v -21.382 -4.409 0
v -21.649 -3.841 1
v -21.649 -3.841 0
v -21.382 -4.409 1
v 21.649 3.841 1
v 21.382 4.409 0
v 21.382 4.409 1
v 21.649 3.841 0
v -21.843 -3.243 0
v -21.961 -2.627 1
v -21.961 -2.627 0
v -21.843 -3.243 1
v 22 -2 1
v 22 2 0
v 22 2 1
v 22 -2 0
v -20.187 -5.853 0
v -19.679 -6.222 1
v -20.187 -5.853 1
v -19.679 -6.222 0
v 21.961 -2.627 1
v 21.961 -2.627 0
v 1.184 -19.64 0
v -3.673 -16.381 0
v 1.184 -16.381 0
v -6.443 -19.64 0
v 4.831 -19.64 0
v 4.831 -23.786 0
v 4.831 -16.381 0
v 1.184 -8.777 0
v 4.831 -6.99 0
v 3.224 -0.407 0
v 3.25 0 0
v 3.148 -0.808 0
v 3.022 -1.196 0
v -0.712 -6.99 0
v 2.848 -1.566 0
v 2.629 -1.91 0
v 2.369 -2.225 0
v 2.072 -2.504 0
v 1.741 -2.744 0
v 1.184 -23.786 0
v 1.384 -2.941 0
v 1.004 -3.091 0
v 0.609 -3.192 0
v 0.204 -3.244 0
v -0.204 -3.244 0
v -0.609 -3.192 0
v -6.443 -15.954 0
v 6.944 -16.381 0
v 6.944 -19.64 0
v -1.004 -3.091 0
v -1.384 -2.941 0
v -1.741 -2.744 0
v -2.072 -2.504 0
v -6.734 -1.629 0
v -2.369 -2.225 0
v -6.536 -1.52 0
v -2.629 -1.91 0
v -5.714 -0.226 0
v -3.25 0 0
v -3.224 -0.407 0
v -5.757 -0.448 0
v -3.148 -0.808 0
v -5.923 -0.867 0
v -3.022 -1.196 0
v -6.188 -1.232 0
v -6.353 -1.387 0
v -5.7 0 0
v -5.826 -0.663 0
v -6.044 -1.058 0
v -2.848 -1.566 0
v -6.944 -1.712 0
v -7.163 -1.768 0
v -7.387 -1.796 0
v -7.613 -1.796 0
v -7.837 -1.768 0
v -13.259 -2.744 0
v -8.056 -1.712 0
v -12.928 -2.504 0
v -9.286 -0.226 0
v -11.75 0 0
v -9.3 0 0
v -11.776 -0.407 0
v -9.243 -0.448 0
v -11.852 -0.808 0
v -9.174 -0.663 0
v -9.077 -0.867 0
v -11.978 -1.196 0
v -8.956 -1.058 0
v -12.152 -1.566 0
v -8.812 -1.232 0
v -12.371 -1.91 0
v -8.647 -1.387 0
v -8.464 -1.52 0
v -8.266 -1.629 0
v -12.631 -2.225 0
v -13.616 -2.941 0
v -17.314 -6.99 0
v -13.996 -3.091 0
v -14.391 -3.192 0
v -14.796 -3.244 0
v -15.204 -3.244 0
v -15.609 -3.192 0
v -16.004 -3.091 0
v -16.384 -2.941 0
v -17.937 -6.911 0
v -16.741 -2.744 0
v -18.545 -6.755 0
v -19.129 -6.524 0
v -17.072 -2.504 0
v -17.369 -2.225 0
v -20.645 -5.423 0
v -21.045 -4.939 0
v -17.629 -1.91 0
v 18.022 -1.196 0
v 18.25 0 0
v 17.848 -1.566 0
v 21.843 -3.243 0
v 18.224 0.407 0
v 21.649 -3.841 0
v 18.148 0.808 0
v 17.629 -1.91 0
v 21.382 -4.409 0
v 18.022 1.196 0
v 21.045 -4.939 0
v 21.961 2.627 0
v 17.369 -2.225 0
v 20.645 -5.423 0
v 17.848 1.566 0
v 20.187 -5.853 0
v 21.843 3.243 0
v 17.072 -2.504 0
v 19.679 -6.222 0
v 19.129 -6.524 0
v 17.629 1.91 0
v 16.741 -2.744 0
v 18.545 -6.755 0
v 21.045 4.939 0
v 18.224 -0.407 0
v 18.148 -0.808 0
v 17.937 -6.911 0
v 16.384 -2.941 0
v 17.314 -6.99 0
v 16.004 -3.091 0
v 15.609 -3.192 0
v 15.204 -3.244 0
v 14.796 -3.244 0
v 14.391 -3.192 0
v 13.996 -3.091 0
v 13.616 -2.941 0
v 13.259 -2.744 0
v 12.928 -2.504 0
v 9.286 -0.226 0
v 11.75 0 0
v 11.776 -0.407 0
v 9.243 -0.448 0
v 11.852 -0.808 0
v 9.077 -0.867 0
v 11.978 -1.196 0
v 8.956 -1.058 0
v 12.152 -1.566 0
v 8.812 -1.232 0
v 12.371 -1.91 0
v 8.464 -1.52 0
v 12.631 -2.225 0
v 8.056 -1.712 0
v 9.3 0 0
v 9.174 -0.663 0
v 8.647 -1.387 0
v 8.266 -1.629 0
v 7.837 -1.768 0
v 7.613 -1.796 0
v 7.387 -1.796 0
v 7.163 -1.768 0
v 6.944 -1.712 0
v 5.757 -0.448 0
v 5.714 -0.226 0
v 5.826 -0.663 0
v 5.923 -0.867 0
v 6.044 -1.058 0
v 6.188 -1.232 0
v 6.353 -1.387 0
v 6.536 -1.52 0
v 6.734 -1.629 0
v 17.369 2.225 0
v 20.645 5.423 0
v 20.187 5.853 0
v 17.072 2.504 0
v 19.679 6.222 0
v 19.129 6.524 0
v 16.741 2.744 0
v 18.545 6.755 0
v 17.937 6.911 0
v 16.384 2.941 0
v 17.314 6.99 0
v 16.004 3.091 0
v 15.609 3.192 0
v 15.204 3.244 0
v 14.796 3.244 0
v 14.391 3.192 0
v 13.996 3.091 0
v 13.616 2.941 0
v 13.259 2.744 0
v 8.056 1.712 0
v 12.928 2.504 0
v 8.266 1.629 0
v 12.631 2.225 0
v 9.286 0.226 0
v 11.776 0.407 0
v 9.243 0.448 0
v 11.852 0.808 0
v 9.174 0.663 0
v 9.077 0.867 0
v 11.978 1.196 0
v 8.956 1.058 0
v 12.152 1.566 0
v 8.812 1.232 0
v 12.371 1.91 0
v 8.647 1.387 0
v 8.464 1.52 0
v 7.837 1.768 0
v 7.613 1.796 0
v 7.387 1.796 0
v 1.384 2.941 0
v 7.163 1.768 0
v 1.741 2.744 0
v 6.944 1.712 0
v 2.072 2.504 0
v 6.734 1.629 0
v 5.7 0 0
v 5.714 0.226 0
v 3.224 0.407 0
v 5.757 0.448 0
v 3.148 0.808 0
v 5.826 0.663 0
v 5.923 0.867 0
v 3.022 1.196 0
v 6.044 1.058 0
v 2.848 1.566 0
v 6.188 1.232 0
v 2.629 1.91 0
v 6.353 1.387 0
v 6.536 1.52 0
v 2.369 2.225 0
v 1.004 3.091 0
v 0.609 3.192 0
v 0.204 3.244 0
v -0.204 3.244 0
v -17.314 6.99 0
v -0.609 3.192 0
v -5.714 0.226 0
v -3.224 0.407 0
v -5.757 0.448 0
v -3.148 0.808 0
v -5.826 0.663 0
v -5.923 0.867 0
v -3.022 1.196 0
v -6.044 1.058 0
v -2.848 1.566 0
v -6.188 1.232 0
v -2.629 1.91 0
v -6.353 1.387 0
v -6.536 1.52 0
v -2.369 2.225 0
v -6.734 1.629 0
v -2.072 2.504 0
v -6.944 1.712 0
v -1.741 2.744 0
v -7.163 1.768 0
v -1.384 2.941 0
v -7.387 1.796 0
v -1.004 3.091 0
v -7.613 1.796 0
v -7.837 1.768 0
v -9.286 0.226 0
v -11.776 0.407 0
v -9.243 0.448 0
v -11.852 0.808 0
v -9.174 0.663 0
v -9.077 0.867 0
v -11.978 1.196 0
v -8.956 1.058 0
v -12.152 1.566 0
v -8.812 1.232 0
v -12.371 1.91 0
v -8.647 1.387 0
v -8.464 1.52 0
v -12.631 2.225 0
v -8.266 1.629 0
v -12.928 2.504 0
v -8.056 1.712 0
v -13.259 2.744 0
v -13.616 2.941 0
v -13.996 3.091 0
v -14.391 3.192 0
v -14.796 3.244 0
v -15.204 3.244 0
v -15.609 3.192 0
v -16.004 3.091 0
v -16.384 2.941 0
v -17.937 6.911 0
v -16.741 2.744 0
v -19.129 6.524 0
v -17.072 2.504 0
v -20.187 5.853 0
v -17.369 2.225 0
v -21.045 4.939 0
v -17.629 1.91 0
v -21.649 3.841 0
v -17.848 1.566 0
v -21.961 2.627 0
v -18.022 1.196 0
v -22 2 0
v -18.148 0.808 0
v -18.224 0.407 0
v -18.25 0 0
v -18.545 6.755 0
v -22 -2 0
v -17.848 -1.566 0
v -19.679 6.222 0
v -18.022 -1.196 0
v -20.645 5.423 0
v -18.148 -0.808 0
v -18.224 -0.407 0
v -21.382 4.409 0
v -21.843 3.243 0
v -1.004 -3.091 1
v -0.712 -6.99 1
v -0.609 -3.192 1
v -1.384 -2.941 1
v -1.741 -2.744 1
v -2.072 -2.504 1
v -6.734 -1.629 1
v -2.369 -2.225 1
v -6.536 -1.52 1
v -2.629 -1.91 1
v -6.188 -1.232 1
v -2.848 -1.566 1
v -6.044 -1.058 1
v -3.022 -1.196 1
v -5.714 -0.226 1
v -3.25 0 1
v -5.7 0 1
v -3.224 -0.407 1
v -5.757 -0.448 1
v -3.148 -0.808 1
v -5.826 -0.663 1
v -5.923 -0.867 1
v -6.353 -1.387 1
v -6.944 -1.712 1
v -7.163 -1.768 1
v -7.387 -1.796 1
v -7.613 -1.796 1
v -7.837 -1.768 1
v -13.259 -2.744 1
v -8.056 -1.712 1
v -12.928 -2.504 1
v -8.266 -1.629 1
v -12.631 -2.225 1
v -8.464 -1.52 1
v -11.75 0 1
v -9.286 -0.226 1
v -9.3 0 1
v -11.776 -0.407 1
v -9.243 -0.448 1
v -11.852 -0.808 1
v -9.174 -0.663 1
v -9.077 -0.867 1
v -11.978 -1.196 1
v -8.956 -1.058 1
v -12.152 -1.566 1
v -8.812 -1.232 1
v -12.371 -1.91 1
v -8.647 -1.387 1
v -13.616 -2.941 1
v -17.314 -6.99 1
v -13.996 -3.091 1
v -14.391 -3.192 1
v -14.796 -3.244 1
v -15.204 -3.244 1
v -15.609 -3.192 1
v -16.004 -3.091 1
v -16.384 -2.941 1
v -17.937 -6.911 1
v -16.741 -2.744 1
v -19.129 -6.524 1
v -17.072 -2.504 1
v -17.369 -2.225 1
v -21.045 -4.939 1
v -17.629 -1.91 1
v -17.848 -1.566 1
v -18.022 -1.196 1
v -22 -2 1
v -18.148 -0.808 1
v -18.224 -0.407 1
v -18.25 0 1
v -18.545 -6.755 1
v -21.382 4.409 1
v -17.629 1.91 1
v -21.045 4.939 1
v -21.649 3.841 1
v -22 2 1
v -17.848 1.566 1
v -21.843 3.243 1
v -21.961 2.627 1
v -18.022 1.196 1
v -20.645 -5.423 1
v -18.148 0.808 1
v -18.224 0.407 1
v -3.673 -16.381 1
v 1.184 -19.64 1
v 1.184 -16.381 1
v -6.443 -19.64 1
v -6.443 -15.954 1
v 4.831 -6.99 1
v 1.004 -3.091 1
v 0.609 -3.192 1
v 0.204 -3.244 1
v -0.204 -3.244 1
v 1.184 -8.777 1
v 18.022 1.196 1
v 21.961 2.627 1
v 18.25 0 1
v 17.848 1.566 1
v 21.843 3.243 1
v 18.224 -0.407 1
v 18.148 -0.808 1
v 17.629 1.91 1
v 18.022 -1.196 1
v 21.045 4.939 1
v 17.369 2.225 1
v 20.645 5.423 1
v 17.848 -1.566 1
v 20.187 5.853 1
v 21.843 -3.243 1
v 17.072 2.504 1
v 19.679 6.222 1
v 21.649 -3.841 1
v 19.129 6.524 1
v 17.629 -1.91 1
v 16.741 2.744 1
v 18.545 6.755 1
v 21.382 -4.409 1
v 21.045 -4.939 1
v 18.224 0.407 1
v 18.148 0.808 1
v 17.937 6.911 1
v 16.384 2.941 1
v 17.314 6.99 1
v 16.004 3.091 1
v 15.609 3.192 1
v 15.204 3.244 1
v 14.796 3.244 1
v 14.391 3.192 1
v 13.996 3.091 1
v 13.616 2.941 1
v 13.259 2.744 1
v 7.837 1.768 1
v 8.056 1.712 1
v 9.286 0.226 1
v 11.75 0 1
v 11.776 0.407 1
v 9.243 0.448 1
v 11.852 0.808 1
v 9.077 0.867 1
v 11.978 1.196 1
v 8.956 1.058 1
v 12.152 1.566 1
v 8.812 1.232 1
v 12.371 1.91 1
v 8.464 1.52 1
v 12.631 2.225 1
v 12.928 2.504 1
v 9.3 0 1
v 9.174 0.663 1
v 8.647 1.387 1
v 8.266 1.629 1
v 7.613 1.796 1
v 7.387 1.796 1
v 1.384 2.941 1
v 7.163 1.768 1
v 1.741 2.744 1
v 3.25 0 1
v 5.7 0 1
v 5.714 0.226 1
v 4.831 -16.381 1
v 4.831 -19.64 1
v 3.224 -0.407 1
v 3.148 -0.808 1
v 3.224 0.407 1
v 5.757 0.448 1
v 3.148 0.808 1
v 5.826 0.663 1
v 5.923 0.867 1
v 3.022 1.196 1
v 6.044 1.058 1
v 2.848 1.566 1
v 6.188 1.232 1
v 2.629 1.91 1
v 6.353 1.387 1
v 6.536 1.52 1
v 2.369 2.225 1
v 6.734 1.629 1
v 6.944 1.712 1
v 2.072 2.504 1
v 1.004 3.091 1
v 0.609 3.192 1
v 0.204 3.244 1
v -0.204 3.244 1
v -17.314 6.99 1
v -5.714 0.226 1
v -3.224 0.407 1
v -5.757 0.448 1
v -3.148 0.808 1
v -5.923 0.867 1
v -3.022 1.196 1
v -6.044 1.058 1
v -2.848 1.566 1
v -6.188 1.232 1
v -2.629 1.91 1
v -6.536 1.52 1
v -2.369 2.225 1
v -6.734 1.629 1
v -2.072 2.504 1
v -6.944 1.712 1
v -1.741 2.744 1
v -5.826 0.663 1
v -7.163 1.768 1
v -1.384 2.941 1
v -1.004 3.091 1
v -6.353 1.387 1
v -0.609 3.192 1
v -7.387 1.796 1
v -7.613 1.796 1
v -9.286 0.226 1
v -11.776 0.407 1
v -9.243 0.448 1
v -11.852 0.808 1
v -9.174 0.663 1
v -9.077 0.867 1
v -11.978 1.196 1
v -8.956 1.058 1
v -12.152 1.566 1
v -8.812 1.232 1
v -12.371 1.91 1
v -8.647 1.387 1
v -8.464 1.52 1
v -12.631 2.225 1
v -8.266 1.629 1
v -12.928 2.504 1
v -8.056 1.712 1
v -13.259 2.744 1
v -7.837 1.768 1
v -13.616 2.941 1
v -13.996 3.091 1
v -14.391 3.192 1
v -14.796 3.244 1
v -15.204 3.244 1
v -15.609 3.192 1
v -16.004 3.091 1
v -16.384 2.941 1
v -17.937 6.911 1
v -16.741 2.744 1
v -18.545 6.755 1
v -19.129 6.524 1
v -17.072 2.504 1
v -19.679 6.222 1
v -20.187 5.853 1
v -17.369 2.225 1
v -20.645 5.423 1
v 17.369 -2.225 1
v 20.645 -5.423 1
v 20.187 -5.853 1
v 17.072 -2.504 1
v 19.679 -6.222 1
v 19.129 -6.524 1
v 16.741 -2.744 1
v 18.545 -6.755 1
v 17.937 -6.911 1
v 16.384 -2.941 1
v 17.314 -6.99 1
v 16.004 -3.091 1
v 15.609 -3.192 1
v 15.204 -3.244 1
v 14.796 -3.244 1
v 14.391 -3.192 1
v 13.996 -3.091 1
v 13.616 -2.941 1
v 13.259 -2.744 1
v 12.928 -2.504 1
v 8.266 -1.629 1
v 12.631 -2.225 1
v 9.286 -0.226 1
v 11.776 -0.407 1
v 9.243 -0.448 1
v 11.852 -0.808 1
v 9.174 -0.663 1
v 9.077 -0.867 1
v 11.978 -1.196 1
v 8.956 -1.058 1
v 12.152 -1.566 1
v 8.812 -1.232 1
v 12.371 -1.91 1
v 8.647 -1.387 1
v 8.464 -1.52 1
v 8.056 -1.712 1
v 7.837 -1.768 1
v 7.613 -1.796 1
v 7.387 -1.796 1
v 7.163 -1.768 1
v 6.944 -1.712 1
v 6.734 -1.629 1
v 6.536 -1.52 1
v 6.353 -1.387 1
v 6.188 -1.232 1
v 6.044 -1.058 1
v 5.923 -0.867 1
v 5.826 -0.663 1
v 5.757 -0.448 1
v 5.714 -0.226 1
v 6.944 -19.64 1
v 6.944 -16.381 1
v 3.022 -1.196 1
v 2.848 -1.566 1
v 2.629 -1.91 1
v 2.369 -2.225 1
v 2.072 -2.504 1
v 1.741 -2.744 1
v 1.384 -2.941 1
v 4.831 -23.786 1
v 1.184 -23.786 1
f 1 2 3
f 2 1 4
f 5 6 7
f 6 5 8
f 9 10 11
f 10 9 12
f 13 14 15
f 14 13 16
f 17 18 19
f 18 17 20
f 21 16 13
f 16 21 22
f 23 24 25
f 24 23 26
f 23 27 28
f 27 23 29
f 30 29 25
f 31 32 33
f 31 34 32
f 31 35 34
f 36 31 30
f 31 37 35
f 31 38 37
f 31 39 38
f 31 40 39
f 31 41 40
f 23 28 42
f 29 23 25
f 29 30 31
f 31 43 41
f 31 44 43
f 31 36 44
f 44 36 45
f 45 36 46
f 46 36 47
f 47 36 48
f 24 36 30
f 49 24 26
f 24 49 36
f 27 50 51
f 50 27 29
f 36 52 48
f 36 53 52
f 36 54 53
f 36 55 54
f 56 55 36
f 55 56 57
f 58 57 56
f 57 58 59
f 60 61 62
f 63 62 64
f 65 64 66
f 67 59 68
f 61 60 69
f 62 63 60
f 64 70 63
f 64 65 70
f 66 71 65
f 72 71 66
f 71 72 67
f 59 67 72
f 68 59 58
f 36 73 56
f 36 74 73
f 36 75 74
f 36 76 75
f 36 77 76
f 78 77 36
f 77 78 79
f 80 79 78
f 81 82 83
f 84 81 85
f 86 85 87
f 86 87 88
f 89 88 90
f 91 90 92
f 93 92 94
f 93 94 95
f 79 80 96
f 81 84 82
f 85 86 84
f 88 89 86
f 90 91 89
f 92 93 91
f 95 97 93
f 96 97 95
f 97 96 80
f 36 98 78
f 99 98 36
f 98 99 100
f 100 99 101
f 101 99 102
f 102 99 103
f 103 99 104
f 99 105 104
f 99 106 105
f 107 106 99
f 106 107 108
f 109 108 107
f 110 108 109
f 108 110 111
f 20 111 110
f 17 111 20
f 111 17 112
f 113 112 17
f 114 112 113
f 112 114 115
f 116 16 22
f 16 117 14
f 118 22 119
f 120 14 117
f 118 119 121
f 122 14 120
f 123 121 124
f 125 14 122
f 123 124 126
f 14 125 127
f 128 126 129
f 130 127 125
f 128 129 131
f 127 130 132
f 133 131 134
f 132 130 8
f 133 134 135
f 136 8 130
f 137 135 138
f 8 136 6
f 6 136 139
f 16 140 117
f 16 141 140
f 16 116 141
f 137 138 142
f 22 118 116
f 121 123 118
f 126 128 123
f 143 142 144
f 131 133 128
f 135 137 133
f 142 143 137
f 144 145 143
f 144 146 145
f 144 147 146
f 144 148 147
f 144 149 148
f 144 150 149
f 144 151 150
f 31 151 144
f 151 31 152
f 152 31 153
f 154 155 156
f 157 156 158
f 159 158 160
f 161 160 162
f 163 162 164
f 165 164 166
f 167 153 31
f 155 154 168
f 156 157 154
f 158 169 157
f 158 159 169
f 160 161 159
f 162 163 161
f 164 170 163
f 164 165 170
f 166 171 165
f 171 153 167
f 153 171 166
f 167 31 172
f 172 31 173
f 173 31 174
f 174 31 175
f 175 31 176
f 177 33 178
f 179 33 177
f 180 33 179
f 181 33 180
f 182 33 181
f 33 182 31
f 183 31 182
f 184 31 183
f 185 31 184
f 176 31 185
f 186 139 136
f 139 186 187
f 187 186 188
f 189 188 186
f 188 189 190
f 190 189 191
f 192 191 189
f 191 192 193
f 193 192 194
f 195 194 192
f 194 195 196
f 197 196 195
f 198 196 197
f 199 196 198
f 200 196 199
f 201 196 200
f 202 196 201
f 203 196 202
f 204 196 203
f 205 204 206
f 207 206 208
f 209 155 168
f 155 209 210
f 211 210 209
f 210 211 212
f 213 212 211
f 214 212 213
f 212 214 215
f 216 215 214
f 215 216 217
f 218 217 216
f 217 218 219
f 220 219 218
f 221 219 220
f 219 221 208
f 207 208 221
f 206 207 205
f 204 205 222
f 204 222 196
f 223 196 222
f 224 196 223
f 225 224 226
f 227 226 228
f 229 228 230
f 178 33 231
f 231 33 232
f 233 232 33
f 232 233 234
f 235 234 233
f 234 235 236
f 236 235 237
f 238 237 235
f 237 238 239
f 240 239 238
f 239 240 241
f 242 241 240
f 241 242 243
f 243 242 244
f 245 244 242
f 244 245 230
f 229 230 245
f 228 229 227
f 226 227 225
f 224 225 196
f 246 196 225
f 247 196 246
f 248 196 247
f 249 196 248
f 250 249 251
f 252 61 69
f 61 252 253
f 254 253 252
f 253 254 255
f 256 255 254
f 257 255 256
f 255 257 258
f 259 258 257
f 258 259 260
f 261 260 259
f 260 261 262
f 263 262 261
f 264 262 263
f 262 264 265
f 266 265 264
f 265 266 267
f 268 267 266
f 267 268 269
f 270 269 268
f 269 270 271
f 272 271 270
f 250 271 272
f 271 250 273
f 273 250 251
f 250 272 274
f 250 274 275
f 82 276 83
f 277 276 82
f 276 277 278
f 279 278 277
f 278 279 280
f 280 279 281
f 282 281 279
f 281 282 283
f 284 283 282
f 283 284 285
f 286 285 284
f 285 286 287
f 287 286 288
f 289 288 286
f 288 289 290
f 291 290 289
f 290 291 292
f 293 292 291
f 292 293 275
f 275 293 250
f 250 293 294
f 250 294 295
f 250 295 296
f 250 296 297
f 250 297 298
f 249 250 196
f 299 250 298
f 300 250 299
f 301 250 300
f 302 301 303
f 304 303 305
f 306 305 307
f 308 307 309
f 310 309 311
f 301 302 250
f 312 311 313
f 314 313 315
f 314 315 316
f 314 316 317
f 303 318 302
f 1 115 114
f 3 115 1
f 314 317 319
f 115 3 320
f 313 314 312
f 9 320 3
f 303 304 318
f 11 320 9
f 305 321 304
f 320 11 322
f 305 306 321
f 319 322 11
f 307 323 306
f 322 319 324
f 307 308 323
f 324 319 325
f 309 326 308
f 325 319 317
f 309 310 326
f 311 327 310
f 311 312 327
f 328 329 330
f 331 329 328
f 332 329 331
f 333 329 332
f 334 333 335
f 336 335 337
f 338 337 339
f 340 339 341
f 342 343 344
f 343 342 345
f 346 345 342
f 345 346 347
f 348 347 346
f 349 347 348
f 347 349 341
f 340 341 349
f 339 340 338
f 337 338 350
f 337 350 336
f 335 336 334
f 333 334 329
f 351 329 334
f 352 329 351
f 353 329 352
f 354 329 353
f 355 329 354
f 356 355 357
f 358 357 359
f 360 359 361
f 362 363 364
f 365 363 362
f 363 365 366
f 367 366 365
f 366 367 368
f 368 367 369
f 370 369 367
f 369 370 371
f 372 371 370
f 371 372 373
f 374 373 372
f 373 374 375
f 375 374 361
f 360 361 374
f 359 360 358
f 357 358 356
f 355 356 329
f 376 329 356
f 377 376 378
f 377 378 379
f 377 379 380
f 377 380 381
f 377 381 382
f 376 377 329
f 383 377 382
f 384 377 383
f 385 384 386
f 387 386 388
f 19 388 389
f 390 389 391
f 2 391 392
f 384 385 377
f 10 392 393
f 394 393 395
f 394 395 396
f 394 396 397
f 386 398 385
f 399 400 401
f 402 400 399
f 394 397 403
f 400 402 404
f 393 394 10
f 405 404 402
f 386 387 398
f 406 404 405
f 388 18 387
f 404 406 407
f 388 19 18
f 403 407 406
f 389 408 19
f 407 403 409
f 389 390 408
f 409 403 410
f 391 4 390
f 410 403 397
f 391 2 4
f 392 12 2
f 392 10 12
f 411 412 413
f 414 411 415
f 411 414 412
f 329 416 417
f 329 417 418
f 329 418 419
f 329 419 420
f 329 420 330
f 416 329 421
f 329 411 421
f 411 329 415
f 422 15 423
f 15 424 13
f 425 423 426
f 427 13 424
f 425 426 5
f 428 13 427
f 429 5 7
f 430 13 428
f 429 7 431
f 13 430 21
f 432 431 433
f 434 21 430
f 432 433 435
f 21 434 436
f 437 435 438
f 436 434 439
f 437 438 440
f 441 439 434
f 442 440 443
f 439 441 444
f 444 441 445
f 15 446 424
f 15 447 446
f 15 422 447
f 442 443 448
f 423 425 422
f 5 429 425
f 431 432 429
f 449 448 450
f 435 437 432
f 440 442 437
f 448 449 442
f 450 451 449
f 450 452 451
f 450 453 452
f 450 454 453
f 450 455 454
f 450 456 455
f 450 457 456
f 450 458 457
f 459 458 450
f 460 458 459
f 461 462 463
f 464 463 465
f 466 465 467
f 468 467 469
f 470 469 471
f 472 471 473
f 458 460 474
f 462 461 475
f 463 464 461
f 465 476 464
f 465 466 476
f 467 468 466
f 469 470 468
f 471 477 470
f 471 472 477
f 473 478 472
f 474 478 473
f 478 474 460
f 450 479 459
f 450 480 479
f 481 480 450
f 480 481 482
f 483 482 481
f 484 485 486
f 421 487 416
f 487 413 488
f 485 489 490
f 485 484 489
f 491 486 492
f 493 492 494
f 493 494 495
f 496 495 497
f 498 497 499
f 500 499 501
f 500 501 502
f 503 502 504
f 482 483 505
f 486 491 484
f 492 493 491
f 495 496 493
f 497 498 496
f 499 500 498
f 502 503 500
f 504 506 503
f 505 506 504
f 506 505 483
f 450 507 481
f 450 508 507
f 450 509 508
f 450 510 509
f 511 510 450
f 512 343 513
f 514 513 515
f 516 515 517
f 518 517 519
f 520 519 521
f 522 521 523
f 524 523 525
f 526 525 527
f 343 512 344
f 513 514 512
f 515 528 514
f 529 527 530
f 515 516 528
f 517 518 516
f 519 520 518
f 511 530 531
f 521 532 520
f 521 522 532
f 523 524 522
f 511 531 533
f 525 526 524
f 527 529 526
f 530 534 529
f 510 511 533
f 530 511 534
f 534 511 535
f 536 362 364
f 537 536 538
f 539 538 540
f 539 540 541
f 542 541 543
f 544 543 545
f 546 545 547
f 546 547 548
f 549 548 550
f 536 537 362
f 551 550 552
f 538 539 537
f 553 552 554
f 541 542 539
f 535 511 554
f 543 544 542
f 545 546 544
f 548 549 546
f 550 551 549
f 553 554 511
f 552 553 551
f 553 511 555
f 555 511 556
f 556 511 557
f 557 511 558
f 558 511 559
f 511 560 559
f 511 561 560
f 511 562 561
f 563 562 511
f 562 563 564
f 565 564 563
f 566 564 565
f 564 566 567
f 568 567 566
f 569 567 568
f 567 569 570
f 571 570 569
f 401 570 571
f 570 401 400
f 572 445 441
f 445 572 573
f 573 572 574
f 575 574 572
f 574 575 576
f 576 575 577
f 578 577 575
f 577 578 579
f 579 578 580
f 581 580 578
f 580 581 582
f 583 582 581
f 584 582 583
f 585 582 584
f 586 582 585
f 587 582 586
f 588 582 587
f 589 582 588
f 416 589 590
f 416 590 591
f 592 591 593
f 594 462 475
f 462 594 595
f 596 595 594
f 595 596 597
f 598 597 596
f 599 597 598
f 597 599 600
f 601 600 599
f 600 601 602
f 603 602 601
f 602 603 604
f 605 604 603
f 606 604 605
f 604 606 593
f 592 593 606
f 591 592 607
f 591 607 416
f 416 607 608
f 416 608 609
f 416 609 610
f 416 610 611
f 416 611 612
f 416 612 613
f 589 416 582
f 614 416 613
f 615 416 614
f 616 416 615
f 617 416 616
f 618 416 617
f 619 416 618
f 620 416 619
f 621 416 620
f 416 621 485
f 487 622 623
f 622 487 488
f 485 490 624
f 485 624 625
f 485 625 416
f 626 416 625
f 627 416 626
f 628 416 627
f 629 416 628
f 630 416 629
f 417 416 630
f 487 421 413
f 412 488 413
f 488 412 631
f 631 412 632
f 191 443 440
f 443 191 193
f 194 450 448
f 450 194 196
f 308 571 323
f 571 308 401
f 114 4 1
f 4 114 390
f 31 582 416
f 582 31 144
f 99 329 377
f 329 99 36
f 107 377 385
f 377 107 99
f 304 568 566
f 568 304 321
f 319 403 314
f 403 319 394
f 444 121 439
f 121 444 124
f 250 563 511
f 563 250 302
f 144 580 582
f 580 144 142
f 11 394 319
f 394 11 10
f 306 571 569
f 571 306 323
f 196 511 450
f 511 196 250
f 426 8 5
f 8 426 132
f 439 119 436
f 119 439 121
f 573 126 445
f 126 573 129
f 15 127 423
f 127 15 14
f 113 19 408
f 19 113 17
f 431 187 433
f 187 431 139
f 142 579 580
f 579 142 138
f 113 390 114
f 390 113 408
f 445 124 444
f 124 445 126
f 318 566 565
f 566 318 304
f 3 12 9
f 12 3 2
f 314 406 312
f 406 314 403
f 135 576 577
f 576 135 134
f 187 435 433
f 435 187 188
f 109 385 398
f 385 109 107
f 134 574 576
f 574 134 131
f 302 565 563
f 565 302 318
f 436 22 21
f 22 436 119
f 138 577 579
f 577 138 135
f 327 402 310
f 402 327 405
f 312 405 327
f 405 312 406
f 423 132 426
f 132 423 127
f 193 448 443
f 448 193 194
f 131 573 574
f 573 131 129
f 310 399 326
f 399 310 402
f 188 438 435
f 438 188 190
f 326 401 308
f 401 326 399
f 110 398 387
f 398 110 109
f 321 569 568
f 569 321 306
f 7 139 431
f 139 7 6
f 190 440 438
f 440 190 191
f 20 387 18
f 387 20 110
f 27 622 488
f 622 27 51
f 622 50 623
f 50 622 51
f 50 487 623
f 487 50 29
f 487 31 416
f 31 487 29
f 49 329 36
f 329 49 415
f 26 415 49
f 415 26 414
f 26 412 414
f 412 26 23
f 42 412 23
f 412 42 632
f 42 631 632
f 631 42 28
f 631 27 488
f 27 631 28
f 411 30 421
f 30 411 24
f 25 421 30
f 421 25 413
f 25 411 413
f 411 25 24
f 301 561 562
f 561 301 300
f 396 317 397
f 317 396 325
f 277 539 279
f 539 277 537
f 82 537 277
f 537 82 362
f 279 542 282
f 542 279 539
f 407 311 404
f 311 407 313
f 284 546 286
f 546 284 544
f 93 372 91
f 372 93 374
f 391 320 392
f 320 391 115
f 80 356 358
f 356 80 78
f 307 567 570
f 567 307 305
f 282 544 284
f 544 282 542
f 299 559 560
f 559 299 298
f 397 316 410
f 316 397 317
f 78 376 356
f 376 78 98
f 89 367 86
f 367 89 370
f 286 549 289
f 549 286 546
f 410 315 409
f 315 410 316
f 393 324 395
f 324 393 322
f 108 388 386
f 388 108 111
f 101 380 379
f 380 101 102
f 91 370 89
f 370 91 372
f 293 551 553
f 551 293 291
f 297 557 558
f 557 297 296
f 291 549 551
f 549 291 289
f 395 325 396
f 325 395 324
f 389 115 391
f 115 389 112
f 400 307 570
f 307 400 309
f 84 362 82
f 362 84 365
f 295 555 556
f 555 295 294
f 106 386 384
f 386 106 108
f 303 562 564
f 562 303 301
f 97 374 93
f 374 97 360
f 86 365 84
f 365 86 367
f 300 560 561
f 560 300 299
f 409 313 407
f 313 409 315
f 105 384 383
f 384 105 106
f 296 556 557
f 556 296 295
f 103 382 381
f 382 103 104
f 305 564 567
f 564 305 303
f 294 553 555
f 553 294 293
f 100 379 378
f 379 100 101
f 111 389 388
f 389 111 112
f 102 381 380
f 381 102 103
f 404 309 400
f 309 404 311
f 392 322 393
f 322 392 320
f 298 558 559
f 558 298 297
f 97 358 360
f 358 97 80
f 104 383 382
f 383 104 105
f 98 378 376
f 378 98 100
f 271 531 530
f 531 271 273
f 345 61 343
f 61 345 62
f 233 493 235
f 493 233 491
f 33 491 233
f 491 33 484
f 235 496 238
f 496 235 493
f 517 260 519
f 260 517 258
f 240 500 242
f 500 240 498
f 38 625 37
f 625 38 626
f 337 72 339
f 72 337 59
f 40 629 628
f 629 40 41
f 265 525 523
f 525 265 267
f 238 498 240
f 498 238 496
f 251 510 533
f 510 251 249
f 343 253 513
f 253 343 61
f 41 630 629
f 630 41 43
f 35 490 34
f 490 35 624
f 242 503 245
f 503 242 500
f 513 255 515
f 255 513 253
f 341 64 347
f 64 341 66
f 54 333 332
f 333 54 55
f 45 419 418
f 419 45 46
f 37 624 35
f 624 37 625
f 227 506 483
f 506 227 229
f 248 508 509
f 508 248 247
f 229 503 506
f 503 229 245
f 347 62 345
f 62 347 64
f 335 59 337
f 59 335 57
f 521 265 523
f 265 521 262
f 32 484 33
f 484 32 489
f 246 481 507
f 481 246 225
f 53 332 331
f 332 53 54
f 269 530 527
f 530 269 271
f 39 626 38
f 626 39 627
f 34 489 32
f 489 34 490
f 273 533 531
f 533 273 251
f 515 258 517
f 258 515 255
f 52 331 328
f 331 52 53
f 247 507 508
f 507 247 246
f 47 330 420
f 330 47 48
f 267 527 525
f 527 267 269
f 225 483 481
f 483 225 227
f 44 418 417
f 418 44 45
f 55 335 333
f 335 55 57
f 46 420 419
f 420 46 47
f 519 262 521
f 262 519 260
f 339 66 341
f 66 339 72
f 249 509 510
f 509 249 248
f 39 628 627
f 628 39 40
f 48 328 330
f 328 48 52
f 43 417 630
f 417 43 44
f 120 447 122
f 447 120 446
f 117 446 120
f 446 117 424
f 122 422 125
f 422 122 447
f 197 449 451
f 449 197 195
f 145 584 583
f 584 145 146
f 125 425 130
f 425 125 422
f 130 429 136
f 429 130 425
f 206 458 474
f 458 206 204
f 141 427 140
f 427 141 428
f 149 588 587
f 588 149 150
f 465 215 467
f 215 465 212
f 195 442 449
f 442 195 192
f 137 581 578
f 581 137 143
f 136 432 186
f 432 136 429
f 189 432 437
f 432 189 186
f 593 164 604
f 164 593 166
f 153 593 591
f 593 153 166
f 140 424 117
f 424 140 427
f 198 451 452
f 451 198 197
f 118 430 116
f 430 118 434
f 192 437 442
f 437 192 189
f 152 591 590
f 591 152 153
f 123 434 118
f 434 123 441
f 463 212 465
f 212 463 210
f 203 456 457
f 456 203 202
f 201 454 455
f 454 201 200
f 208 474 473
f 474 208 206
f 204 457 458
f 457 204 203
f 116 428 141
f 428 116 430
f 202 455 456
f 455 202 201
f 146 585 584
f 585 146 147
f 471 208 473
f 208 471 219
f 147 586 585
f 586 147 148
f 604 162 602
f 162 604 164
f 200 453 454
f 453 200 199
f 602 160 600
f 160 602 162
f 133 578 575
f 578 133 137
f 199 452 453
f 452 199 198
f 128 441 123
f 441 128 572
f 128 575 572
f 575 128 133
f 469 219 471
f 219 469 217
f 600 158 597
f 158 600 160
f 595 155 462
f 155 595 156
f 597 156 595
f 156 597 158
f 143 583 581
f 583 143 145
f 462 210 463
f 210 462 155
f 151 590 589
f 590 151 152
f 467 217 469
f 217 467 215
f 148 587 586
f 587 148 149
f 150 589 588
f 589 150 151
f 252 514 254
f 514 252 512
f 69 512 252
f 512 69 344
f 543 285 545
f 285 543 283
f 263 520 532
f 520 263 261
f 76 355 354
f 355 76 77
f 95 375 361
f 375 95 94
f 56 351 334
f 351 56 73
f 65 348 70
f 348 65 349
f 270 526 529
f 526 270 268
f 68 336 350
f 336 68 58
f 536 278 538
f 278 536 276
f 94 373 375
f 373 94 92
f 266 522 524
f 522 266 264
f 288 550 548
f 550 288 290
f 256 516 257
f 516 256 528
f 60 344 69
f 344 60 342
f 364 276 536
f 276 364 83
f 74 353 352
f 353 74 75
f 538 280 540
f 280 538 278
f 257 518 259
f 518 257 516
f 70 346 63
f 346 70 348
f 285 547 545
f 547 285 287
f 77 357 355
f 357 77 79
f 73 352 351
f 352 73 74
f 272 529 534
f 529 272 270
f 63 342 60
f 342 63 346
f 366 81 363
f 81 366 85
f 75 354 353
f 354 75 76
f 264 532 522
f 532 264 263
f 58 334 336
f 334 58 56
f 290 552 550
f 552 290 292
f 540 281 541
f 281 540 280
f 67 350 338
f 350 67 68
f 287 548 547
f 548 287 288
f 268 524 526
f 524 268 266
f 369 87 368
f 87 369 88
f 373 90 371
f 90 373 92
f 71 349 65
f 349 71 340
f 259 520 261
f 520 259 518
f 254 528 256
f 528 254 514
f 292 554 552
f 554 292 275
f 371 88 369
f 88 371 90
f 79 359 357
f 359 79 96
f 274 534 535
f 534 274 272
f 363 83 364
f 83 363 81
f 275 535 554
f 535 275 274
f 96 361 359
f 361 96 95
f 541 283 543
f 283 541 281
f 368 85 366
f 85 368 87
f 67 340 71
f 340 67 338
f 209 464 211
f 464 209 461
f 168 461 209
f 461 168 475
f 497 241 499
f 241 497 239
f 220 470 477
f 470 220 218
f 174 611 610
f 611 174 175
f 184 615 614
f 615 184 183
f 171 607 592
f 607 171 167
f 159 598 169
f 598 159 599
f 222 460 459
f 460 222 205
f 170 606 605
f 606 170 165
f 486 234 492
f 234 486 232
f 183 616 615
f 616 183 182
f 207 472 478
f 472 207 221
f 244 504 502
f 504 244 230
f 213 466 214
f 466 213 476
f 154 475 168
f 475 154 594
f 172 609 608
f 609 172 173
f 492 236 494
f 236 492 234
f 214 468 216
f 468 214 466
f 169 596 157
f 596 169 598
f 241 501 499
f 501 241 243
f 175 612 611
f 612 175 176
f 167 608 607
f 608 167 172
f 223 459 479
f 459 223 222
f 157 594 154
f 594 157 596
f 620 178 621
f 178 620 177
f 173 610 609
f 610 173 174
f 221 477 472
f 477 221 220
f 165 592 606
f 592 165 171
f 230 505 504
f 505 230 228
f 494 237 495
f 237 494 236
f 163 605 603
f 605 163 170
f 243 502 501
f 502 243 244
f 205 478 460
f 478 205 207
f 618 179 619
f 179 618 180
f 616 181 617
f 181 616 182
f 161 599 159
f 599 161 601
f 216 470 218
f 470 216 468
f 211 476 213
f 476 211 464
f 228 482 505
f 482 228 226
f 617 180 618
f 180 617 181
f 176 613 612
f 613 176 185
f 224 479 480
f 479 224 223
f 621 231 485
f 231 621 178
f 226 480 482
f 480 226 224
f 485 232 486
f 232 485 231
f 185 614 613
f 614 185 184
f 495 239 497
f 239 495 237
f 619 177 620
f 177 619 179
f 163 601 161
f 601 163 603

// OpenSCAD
$fn = 50;


difference() {
	union() {
		*color(alpha = 1.0000000000, c = "gray") {
			translate(v = [0, 14, 0]) {
				linear_extrude(height = 1) {
					text(font = "Arial:style=Bold", halign = "center", size = 4.5000000000, text = "COMMENT description oobb_plate_shape_p_type_1_depth_3_width_1_thickness_4_extra_oobb_size", valign = "center");
				}
			}
		}
		hull() {
			translate(v = [-17.0000000000, 2.0000000000, 0]) {
				cylinder(h = 1, r = 5);
			}
			translate(v = [17.0000000000, 2.0000000000, 0]) {
				cylinder(h = 1, r = 5);
			}
			translate(v = [-17.0000000000, -2.0000000000, 0]) {
				cylinder(h = 1, r = 5);
			}
			translate(v = [17.0000000000, -2.0000000000, 0]) {
				cylinder(h = 1, r = 5);
			}
		}
		translate(v = [0, -5, 0]) {
			linear_extrude(height = 1) {
				text(font = "DejaVu Sans Mono:style=Bold", halign = "center", size = 19.0000000000, text = "4", valign = "top");
			}
		}
	}
	union() {
		*color(alpha = 1.0000000000, c = "gray") {
			translate(v = [0, 14, 0]) {
				linear_extrude(height = 1) {
					text(font = "Arial:style=Bold", halign = "center", size = 4.5000000000, text = "COMMENT description oobb_holes_shape_n_type_3_width_1_thickness_4_extra_oobb_size_1_height_'all'_holes_true_both_holes", valign = "center");
				}
			}
		}
		translate(v = [-15.0000000000, 0.0000000000, 0]) {
			translate(v = [0, 0, -50]) {
				cylinder(h = 100, r = 3.2500000000);
			}
		}
		translate(v = [0, 0, -50]) {
			cylinder(h = 100, r = 3.2500000000);
		}
		translate(v = [15.0000000000, 0.0000000000, 0]) {
			translate(v = [0, 0, -50]) {
				cylinder(h = 100, r = 3.2500000000);
			}
		}
		translate(v = [-15.0000000000, 0.0000000000, 0]) {
			translate(v = [0, 0, -50]) {
				cylinder(h = 100, r = 1.8000000000);
			}
		}
		translate(v = [-7.5000000000, 0.0000000000, 0]) {
			translate(v = [0, 0, -50]) {
				cylinder(h = 100, r = 1.8000000000);
			}
		}
		translate(v = [0, 0, -50]) {
			cylinder(h = 100, r = 1.8000000000);
		}
		translate(v = [7.5000000000, 0.0000000000, 0]) {
			translate(v = [0, 0, -50]) {
				cylinder(h = 100, r = 1.8000000000);
			}
		}
		translate(v = [15.0000000000, 0.0000000000, 0]) {
			translate(v = [0, 0, -50]) {
				cylinder(h = 100, r = 1.8000000000);
			}
		}
	}
}
